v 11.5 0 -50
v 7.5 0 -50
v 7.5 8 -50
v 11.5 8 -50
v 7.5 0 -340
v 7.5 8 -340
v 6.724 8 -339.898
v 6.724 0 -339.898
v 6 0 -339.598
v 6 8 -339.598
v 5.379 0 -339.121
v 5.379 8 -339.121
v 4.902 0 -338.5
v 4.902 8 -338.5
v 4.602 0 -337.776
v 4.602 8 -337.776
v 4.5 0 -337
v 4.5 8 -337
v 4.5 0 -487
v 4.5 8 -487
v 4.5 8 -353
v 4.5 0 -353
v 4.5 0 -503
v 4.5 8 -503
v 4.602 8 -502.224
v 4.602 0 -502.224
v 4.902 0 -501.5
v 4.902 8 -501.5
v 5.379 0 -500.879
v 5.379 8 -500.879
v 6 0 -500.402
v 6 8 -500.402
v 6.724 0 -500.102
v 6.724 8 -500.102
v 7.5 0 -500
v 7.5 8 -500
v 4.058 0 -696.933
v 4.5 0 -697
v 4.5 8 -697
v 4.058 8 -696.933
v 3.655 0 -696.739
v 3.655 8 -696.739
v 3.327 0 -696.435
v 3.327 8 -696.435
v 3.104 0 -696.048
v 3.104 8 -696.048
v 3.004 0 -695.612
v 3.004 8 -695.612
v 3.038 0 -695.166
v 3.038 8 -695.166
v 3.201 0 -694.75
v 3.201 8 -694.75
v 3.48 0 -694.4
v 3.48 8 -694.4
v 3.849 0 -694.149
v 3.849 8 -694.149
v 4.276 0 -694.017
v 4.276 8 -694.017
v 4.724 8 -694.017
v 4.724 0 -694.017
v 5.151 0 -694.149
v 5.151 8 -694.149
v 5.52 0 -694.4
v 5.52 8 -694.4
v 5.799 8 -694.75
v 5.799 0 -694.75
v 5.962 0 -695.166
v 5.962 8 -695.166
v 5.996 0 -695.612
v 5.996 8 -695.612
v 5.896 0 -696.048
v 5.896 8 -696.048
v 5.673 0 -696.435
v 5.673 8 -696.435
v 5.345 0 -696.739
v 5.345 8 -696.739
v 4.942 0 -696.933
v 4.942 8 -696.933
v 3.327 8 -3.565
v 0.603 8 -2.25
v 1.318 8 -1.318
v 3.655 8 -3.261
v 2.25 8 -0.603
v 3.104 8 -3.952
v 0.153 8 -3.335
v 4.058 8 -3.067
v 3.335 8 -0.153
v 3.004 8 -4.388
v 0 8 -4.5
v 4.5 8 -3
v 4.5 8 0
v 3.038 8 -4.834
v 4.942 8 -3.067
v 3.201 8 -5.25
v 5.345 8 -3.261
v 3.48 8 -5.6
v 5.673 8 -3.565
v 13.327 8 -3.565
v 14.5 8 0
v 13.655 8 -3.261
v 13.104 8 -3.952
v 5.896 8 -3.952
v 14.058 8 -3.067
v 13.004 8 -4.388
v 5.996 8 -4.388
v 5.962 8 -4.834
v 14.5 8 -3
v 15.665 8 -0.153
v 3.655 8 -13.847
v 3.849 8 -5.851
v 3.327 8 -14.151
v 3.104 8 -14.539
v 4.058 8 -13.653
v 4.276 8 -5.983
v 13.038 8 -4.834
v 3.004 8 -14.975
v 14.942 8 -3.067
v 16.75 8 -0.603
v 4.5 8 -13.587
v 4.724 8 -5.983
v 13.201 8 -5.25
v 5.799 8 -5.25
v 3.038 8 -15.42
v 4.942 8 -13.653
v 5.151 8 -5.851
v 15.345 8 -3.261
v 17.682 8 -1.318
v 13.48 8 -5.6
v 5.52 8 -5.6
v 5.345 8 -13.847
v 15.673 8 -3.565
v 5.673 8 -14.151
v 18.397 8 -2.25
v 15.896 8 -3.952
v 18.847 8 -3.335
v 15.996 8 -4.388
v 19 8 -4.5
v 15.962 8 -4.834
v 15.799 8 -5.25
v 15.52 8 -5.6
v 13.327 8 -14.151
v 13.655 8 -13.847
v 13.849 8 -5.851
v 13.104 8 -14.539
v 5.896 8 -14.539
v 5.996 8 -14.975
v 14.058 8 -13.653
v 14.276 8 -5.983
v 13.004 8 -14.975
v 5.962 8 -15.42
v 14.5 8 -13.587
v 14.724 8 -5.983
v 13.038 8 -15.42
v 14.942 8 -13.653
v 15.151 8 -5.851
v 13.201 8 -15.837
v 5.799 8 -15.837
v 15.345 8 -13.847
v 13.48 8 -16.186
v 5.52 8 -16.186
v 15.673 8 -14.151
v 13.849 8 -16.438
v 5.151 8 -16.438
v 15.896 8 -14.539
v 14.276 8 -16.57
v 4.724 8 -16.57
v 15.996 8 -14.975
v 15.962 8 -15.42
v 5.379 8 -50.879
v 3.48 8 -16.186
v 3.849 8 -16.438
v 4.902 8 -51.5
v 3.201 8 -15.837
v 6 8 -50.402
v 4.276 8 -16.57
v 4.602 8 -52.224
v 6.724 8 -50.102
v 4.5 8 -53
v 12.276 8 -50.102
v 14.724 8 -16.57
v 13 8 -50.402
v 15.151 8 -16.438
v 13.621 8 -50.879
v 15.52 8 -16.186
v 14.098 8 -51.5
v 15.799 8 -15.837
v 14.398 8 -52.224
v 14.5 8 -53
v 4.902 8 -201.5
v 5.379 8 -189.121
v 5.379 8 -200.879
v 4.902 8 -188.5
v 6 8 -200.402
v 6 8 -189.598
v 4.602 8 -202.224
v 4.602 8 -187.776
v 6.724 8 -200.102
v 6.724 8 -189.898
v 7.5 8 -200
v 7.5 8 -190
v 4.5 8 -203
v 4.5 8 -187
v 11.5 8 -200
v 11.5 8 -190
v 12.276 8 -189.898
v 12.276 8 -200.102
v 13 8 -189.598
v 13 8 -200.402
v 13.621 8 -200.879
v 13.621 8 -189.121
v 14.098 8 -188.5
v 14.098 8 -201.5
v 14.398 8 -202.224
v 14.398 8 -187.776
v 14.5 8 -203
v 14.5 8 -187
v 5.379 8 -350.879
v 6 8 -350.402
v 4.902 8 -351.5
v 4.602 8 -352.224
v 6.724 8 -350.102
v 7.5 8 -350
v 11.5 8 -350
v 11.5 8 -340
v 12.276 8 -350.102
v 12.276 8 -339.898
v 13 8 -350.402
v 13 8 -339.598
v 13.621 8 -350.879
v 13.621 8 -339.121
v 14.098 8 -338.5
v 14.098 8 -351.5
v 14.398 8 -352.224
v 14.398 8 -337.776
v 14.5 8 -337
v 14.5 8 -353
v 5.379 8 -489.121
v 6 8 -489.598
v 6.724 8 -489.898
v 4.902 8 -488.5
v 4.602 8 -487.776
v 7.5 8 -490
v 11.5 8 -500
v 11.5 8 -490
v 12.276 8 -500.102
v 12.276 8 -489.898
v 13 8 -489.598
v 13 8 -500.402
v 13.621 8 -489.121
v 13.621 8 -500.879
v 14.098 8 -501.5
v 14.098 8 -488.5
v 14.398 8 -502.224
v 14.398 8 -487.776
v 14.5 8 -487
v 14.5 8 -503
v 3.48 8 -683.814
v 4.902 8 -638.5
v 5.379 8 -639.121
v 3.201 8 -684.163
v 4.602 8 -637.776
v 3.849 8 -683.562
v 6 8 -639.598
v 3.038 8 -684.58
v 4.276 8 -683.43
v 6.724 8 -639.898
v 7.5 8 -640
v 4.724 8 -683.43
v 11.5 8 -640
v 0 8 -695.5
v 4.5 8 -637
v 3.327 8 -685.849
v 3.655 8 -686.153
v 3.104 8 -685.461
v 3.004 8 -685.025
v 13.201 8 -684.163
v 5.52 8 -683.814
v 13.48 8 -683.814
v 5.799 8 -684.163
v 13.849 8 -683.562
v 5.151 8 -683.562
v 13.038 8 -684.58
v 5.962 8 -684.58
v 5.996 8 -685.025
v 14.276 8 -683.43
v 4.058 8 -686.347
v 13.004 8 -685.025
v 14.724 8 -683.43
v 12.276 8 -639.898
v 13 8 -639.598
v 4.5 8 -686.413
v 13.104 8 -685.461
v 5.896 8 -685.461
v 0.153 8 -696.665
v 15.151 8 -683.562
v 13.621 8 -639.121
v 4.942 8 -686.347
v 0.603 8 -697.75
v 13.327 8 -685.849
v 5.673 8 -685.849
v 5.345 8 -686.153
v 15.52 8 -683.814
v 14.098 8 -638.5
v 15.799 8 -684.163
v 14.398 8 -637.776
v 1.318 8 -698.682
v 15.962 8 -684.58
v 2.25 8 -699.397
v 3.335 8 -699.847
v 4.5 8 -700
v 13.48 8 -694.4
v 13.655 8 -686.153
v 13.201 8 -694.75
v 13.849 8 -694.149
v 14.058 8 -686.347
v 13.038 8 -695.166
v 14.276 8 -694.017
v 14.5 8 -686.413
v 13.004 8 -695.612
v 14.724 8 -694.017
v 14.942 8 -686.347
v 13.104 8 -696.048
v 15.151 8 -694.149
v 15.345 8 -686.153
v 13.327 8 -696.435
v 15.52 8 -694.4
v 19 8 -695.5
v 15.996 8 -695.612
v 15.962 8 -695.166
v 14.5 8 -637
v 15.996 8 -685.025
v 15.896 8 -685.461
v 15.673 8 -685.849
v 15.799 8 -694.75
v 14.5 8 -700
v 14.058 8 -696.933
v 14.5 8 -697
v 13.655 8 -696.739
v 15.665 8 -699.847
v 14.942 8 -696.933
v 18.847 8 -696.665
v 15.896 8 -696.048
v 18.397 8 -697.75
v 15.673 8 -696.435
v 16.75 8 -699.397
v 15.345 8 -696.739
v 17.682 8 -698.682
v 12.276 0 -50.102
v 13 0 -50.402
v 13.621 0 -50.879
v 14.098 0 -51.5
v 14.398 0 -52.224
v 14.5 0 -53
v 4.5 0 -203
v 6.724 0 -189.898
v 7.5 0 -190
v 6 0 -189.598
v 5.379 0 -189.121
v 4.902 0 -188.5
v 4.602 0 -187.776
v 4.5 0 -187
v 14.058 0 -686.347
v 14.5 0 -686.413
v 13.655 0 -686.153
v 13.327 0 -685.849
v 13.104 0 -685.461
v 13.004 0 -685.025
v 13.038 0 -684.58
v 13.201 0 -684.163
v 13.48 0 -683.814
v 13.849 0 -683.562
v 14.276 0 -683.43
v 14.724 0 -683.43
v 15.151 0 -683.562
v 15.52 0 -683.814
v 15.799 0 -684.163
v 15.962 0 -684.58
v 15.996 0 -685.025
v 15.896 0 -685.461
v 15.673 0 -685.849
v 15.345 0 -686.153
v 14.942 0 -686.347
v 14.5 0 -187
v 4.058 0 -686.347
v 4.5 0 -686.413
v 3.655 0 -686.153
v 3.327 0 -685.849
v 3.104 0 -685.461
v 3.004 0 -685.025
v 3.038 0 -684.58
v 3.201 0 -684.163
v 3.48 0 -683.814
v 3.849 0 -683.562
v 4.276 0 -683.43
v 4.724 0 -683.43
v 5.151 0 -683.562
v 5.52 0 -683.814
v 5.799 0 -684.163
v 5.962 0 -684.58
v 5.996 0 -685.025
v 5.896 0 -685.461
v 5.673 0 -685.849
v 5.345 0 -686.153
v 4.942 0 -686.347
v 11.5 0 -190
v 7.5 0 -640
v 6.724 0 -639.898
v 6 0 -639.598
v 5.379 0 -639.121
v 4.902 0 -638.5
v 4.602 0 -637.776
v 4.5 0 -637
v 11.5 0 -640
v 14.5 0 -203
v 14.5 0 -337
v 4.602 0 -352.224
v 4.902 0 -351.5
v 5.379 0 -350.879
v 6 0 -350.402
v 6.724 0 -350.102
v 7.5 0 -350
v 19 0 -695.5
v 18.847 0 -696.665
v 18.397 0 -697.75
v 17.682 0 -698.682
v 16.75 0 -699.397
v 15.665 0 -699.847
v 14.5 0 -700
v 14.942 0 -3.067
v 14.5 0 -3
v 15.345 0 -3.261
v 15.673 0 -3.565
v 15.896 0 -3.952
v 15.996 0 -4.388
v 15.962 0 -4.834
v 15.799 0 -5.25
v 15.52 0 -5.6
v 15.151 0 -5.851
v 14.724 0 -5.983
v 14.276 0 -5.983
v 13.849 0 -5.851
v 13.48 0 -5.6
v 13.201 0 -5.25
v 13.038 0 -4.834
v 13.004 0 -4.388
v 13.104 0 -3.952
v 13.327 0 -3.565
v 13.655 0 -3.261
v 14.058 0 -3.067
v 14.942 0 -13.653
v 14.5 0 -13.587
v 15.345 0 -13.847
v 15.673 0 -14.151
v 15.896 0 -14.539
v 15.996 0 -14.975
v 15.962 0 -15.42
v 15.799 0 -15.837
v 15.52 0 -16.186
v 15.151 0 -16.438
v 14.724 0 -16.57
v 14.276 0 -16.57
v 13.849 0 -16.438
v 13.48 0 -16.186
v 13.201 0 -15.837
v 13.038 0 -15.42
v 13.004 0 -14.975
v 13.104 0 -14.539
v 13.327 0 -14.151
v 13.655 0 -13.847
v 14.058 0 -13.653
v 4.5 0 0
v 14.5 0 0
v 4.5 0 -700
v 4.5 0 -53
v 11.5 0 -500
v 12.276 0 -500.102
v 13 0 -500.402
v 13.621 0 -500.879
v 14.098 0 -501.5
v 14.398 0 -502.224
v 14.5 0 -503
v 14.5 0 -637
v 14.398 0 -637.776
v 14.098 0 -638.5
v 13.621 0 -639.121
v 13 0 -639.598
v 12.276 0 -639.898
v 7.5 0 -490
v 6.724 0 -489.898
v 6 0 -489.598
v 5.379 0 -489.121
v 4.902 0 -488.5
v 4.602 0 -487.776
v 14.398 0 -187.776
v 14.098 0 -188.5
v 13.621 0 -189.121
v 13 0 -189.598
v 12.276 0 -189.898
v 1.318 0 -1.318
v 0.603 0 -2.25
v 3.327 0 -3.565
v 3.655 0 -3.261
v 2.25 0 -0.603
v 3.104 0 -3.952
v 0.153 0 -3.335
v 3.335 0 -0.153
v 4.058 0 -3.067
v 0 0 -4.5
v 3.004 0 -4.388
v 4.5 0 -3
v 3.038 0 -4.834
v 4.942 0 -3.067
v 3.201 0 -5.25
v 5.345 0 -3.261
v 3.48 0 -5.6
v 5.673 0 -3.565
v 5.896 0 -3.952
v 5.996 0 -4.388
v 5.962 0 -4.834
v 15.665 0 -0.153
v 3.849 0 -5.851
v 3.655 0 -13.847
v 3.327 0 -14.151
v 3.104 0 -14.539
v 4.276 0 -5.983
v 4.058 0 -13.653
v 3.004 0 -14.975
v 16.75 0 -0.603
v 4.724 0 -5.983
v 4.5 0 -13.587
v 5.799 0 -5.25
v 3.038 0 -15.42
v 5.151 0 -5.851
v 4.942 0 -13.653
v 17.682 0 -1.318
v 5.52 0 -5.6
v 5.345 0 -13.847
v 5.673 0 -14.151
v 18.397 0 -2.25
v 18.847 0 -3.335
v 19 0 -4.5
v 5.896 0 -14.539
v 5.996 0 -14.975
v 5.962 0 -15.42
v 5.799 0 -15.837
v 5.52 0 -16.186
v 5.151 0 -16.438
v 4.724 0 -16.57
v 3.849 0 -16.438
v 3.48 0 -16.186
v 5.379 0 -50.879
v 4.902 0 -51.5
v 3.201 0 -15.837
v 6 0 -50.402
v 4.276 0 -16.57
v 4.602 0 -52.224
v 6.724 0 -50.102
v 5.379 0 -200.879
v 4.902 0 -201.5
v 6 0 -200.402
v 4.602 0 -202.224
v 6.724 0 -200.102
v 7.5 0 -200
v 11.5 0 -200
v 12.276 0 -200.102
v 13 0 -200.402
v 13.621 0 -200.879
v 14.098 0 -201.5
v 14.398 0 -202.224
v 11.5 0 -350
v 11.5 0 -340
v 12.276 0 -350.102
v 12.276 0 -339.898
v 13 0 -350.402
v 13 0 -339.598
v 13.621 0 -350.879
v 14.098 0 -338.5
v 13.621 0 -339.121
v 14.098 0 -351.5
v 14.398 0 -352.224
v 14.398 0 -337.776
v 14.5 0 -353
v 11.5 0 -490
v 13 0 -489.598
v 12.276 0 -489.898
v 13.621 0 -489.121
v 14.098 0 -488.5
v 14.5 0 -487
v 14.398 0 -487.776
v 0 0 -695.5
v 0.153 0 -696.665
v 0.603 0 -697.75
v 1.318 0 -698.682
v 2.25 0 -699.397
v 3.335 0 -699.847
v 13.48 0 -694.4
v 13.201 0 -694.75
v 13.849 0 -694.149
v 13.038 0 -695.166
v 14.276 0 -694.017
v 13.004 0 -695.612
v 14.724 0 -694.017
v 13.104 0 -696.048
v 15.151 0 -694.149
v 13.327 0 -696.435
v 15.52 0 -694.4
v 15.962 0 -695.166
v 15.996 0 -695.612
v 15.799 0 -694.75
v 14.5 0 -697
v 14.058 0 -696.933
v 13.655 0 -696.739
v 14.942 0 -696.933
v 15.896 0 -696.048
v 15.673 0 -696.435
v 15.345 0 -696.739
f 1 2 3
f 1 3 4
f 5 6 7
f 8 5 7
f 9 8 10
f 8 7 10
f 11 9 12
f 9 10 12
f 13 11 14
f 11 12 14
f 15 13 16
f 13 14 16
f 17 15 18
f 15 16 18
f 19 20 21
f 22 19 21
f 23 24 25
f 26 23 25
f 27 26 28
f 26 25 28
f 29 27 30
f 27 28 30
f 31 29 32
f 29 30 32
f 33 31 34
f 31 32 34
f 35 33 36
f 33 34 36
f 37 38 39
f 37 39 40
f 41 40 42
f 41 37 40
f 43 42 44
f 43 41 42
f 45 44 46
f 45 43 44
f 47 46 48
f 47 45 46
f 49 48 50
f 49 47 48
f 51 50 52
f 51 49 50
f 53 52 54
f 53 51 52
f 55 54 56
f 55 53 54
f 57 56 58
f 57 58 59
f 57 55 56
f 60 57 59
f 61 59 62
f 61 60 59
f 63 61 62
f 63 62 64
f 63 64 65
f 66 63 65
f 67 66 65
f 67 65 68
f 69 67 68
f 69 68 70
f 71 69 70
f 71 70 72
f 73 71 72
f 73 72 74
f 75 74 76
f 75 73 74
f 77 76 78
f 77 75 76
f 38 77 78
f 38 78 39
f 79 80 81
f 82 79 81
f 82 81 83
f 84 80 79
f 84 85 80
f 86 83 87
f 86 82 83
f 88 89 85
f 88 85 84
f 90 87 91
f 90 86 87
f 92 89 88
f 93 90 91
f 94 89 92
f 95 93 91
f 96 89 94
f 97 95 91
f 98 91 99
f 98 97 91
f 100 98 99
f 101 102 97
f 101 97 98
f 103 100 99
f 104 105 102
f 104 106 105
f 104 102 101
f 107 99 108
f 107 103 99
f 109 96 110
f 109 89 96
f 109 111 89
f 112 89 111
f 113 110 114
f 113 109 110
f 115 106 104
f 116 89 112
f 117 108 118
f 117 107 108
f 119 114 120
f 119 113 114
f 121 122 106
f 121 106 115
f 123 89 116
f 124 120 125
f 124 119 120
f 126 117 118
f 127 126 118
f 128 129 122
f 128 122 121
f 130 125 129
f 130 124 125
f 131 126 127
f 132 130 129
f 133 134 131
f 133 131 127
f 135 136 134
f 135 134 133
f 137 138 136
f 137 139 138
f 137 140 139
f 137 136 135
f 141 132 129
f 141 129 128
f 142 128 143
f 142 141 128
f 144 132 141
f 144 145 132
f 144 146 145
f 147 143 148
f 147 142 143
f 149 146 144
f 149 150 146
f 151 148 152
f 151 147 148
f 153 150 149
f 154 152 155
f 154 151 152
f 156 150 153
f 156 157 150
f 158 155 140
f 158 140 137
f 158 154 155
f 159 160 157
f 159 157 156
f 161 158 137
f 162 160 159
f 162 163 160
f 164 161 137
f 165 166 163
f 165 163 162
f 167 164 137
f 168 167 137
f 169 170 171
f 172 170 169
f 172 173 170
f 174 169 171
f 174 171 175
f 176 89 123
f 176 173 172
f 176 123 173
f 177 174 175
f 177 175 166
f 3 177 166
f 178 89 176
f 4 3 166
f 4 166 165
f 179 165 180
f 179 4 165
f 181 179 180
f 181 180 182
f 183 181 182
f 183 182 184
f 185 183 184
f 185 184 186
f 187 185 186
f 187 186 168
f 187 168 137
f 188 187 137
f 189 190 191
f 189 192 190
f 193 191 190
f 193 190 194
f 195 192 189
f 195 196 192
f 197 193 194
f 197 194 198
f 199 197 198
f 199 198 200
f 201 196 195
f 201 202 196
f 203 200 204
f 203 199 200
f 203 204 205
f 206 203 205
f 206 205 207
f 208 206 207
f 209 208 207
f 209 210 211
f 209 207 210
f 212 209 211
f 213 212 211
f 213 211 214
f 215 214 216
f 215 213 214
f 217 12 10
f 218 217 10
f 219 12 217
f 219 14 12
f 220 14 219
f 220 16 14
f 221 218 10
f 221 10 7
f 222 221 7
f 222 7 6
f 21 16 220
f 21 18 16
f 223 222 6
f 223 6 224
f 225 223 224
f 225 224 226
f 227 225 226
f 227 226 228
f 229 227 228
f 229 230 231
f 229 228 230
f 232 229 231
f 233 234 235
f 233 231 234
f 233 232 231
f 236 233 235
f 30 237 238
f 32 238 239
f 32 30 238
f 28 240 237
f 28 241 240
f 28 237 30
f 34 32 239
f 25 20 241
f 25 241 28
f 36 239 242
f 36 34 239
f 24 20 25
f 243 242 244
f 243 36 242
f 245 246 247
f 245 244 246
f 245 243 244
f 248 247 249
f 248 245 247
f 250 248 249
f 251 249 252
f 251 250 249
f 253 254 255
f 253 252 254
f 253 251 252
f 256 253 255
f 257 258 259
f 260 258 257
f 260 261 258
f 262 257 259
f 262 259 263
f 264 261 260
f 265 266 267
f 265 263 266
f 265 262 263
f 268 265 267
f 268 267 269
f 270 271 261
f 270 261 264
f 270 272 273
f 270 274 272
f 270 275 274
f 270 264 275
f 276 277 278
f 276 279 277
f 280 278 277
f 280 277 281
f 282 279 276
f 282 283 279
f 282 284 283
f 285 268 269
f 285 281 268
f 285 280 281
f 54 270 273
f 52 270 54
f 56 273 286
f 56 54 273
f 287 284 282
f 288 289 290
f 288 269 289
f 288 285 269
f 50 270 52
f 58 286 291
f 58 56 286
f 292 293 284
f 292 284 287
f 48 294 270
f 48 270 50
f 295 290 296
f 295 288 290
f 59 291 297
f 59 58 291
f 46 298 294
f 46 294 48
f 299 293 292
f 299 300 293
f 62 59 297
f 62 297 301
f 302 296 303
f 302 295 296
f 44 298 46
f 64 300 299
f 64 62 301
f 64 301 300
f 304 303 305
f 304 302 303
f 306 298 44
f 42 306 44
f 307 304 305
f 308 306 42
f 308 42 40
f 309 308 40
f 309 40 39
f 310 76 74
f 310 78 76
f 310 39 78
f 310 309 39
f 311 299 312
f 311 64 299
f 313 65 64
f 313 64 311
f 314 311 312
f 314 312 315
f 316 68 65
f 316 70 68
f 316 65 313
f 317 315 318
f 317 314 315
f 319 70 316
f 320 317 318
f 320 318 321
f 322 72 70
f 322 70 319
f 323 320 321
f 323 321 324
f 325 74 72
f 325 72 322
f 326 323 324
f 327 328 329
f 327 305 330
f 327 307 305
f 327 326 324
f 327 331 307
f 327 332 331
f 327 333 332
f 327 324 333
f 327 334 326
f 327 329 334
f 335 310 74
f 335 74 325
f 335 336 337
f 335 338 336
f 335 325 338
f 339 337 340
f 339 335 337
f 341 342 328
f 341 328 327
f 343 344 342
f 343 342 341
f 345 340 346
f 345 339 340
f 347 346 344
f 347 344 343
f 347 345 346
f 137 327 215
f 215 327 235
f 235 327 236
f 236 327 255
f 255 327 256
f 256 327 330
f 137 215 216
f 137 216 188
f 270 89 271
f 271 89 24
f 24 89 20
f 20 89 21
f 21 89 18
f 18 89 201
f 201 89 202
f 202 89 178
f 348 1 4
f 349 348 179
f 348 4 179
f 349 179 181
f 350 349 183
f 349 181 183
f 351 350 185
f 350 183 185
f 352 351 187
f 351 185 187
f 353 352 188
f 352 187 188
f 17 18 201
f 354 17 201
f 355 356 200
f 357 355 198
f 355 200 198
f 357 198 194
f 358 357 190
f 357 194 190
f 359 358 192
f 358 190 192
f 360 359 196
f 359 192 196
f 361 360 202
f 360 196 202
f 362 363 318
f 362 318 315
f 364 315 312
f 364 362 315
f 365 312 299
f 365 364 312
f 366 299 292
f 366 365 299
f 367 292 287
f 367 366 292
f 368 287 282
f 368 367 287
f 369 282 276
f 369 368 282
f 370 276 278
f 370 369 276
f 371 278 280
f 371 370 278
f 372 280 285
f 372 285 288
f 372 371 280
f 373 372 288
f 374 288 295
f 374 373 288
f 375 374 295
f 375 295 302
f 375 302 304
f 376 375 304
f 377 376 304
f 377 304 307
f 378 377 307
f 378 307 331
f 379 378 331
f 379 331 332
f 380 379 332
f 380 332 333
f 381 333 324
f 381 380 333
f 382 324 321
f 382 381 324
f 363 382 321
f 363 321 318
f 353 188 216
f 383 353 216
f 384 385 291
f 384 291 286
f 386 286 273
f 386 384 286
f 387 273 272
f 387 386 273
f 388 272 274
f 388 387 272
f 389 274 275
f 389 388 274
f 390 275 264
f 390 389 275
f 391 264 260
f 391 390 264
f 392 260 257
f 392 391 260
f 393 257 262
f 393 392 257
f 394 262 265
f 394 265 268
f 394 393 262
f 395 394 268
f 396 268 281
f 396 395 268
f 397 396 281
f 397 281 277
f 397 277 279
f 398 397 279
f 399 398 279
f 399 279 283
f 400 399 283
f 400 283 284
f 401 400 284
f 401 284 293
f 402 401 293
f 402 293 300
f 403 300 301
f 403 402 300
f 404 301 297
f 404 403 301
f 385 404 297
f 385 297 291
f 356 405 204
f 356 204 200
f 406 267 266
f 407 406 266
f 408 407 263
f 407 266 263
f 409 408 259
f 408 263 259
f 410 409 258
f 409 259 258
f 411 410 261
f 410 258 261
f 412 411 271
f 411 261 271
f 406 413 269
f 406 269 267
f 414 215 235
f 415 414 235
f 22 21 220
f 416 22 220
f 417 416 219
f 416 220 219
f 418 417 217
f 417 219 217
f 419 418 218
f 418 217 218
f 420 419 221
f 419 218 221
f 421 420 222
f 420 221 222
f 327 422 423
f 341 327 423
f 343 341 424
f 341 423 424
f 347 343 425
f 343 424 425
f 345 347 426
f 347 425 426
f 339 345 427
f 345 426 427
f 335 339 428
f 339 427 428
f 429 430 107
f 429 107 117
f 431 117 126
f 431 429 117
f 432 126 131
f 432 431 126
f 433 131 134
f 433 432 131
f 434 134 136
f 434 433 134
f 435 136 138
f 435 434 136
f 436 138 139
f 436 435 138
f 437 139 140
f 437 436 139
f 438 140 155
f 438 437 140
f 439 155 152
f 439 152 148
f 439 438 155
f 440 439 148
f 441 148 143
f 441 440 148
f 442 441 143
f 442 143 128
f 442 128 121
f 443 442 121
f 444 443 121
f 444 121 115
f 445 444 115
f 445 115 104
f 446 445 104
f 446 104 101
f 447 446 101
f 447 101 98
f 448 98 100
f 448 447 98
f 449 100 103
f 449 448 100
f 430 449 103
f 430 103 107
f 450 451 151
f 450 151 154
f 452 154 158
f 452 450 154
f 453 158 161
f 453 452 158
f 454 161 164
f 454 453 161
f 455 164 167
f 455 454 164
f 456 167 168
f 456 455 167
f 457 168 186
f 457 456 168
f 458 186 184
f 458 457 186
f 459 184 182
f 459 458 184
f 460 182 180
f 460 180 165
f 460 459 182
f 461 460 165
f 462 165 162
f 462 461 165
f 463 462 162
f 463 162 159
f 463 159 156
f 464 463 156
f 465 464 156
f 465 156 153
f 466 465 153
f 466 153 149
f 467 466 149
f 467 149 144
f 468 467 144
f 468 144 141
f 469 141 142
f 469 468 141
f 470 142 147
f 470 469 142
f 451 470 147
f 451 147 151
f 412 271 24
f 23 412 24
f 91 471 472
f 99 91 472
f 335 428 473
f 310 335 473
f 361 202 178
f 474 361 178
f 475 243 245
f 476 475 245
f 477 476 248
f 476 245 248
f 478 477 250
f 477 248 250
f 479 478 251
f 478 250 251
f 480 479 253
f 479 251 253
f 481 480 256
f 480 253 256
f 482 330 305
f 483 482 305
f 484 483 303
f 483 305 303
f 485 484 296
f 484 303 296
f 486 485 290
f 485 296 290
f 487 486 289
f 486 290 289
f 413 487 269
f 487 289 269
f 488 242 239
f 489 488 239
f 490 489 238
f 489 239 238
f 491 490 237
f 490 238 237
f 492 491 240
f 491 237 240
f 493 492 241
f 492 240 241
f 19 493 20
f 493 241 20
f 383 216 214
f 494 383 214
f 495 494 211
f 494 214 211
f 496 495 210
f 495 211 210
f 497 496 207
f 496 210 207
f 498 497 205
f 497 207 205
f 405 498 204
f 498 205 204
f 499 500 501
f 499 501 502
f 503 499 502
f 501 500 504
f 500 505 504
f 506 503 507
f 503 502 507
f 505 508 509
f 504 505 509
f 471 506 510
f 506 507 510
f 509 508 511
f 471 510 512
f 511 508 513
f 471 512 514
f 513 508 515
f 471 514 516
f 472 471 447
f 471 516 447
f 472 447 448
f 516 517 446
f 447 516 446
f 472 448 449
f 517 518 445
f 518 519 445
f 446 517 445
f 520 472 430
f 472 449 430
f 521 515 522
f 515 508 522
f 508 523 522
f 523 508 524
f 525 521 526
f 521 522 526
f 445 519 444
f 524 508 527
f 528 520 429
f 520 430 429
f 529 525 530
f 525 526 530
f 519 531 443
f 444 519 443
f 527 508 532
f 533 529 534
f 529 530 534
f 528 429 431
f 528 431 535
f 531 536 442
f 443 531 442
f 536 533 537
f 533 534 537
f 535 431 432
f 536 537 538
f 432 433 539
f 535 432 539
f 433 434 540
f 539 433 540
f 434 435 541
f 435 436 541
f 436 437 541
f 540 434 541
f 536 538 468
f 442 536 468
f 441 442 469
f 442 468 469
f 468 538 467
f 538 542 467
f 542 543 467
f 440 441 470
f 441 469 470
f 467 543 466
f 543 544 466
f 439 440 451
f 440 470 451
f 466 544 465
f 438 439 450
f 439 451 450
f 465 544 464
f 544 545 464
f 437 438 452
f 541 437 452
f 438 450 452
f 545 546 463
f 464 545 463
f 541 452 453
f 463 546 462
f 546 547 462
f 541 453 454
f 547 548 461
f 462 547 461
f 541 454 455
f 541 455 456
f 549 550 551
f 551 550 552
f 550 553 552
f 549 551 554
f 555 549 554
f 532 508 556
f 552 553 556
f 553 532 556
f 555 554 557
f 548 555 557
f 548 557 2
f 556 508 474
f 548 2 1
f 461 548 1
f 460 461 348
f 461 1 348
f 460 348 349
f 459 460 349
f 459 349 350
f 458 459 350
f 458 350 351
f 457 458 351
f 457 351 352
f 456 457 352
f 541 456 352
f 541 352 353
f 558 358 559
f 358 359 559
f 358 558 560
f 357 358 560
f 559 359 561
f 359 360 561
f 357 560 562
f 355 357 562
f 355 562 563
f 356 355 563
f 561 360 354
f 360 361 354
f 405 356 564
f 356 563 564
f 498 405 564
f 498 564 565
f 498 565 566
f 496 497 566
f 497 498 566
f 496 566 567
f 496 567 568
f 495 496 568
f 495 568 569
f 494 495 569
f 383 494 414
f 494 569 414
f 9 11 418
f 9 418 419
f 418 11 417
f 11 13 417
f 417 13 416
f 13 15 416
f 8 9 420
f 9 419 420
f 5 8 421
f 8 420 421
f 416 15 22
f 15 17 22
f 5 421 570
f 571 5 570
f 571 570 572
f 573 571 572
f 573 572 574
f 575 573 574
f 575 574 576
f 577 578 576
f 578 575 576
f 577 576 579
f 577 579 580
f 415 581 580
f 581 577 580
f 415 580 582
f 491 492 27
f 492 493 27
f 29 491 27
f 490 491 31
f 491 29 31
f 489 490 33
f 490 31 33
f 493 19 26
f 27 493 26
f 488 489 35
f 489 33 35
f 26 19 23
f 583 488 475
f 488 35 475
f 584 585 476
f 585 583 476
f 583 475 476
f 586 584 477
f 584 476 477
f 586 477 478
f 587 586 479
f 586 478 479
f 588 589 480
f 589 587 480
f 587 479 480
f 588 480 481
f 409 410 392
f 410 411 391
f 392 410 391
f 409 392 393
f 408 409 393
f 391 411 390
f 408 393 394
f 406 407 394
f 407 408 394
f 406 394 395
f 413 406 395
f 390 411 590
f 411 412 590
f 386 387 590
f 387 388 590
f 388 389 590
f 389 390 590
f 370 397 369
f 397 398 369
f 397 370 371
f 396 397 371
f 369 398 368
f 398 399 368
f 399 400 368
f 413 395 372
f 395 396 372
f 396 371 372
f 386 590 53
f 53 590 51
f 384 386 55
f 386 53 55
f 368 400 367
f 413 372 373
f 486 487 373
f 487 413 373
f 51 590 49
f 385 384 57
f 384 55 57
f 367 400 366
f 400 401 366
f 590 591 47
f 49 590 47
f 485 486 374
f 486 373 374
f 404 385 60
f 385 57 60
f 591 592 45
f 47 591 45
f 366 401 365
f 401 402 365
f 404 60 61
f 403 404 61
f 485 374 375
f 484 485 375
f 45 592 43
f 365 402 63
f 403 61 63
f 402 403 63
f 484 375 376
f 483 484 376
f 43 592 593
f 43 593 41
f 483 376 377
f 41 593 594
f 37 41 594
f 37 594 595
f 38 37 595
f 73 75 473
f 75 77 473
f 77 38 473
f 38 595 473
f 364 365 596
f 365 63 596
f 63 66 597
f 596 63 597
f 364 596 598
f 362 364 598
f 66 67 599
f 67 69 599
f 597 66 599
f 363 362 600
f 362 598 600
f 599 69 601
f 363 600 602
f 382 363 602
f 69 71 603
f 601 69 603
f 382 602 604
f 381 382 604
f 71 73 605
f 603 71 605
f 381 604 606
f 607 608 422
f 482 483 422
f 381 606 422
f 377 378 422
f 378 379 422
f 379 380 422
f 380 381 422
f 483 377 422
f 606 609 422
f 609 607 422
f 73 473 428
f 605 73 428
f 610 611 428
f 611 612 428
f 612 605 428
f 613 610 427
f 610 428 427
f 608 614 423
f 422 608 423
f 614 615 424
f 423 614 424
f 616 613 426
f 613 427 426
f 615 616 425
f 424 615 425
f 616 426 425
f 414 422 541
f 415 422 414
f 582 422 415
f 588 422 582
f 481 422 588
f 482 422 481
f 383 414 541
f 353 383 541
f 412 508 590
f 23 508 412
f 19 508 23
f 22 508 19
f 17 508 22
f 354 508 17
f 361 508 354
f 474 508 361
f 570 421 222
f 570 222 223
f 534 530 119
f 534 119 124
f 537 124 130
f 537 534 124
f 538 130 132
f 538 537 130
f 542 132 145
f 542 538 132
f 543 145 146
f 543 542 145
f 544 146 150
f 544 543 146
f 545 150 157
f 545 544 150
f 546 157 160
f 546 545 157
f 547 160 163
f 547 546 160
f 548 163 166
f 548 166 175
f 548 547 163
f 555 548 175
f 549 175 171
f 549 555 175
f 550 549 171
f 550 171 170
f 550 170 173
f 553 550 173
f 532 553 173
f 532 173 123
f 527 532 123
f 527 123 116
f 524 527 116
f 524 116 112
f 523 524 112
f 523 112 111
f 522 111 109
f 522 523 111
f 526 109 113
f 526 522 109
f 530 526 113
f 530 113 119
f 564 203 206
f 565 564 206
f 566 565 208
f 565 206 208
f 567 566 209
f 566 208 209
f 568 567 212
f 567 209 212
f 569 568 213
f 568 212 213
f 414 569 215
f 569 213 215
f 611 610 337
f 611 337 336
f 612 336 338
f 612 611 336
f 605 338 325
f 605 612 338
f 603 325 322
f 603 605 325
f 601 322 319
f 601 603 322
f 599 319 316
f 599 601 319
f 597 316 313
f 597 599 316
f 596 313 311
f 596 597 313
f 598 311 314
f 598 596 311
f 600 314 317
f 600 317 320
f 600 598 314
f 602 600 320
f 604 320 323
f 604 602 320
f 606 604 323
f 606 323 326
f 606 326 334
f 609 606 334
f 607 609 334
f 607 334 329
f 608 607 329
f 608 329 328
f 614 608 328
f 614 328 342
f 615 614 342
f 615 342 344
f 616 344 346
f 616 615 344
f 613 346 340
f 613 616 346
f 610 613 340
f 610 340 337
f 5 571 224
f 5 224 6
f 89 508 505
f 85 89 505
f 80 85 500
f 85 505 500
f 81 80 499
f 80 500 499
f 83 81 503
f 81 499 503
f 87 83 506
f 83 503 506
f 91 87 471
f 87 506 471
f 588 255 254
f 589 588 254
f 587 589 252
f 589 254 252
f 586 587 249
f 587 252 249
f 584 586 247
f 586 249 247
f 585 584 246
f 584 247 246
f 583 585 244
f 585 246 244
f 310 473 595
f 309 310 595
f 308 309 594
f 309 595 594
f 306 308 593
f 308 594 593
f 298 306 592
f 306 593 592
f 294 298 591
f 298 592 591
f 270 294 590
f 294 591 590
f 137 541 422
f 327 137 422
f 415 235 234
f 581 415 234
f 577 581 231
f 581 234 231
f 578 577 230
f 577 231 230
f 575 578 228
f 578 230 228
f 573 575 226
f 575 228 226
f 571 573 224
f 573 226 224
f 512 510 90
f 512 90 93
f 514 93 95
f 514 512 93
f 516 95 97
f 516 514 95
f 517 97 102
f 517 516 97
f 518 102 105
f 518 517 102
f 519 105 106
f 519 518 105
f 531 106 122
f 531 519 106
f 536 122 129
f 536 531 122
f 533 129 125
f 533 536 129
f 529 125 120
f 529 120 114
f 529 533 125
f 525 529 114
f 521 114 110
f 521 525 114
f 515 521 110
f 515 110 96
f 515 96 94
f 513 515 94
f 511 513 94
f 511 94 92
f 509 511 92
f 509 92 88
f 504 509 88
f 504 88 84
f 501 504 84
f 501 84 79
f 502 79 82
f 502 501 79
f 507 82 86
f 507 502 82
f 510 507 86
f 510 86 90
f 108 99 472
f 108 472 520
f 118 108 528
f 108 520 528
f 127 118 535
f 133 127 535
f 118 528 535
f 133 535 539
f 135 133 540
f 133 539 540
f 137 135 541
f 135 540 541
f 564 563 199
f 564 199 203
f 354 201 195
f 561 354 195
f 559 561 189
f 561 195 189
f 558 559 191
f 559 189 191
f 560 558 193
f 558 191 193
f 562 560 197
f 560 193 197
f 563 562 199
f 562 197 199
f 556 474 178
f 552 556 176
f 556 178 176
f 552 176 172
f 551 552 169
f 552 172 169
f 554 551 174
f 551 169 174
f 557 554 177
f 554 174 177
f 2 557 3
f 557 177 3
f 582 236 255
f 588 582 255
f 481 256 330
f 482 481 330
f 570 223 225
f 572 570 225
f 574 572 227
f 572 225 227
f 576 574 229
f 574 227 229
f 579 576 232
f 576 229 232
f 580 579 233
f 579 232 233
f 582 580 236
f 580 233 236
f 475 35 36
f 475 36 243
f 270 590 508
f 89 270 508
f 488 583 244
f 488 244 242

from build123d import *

# Parameters (mm, degrees)
SKETCH_1_R          = 1.5
EXTRUDE_1_DEPTH     = 8
CUT_EXTRUDE_2_DEPTH = 701.303505632


with BuildPart() as part:
    # 草图1 → 凸台-拉伸1 (new body)
    with BuildSketch(Plane(origin=(0, 0, 0), x_dir=(1, 0, 0), z_dir=(0, 1, 0))):
        with BuildLine():
            Line((4.5, 0), (14.5, 0))
            ThreePointArc((14.5, 0), (17.681980515, 1.318019485), (19, 4.5))
            Line((19, 4.5), (19, 695.5))
            ThreePointArc((19, 695.5), (17.681980515, 698.681980515), (14.5, 700))
            Line((14.5, 700), (4.5, 700))
            ThreePointArc((4.5, 700), (1.318019485, 698.681980515), (0, 695.5))
            Line((0, 695.5), (0, 4.5))
            ThreePointArc((0, 4.5), (1.318019485, 1.318019485), (4.5, 0))
        make_face()
        with Locations(Location((4.5, 4.5, 0), (0, 0, 270))):
            Circle(SKETCH_1_R, mode=Mode.SUBTRACT)
        with Locations(Location((14.5, 4.5, 0), (0, 0, 270))):
            Circle(SKETCH_1_R, mode=Mode.SUBTRACT)
        with Locations(Location((4.5, 15.08659859, 0), (0, 0, 270))):
            Circle(SKETCH_1_R, mode=Mode.SUBTRACT)
        with Locations(Location((14.5, 15.08659859, 0), (0, 0, 270))):
            Circle(SKETCH_1_R, mode=Mode.SUBTRACT)
        with Locations(Location((14.5, 684.91340141, 0), (0, 0, 90))):
            Circle(SKETCH_1_R, mode=Mode.SUBTRACT)
        with Locations(Location((4.5, 684.91340141, 0), (0, 0, 90))):
            Circle(SKETCH_1_R, mode=Mode.SUBTRACT)
        with Locations(Location((14.5, 695.5, 0), (0, 0, 90))):
            Circle(SKETCH_1_R, mode=Mode.SUBTRACT)
        with Locations(Location((4.5, 695.5, 0), (0, 0, 90))):
            Circle(SKETCH_1_R, mode=Mode.SUBTRACT)
    extrude(amount=EXTRUDE_1_DEPTH)

    # 草图5 → 切除-拉伸2 (cut, through all)
    with BuildSketch(Plane(origin=(0, 8, 0), x_dir=(1, 0, 0), z_dir=(0, 1, 0))):
        with BuildLine():
            Line((7.5, 50), (11.5, 50))
            ThreePointArc((11.5, 50), (13.621320344, 50.878679656), (14.5, 53))
            Line((14.5, 53), (14.5, 187))
            ThreePointArc((14.5, 187), (13.621320344, 189.121320344), (11.5, 190))
            Line((11.5, 190), (7.5, 190))
            ThreePointArc((7.5, 190), (5.378679656, 189.121320344), (4.5, 187))
            Line((4.5, 187), (4.5, 53))
            ThreePointArc((4.5, 53), (5.378679656, 50.878679656), (7.5, 50))
        make_face()
        with BuildLine():
            Line((14.5, 203), (14.5, 337))
            ThreePointArc((14.5, 337), (13.621320344, 339.121320344), (11.5, 340))
            Line((11.5, 340), (7.5, 340))
            ThreePointArc((7.5, 340), (5.378679656, 339.121320344), (4.5, 337))
            Line((4.5, 337), (4.5, 203))
            ThreePointArc((4.5, 203), (5.378679656, 200.878679656), (7.5, 200))
            Line((7.5, 200), (11.5, 200))
            ThreePointArc((11.5, 200), (13.621320344, 200.878679656), (14.5, 203))
        make_face()
        with BuildLine():
            Line((14.5, 353), (14.5, 487))
            ThreePointArc((14.5, 487), (13.621320344, 489.121320344), (11.5, 490))
            Line((11.5, 490), (7.5, 490))
            ThreePointArc((7.5, 490), (5.378679656, 489.121320344), (4.5, 487))
            Line((4.5, 487), (4.5, 353))
            ThreePointArc((4.5, 353), (5.378679656, 350.878679656), (7.5, 350))
            Line((7.5, 350), (11.5, 350))
            ThreePointArc((11.5, 350), (13.621320344, 350.878679656), (14.5, 353))
        make_face()
        with BuildLine():
            Line((14.5, 503), (14.5, 637))
            ThreePointArc((14.5, 637), (13.621320344, 639.121320344), (11.5, 640))
            Line((11.5, 640), (7.5, 640))
            ThreePointArc((7.5, 640), (5.378679656, 639.121320344), (4.5, 637))
            Line((4.5, 637), (4.5, 503))
            ThreePointArc((4.5, 503), (5.378679656, 500.878679656), (7.5, 500))
            Line((7.5, 500), (11.5, 500))
            ThreePointArc((11.5, 500), (13.621320344, 500.878679656), (14.5, 503))
        make_face()
    extrude(amount=-CUT_EXTRUDE_2_DEPTH, mode=Mode.SUBTRACT)


solid = part.part
